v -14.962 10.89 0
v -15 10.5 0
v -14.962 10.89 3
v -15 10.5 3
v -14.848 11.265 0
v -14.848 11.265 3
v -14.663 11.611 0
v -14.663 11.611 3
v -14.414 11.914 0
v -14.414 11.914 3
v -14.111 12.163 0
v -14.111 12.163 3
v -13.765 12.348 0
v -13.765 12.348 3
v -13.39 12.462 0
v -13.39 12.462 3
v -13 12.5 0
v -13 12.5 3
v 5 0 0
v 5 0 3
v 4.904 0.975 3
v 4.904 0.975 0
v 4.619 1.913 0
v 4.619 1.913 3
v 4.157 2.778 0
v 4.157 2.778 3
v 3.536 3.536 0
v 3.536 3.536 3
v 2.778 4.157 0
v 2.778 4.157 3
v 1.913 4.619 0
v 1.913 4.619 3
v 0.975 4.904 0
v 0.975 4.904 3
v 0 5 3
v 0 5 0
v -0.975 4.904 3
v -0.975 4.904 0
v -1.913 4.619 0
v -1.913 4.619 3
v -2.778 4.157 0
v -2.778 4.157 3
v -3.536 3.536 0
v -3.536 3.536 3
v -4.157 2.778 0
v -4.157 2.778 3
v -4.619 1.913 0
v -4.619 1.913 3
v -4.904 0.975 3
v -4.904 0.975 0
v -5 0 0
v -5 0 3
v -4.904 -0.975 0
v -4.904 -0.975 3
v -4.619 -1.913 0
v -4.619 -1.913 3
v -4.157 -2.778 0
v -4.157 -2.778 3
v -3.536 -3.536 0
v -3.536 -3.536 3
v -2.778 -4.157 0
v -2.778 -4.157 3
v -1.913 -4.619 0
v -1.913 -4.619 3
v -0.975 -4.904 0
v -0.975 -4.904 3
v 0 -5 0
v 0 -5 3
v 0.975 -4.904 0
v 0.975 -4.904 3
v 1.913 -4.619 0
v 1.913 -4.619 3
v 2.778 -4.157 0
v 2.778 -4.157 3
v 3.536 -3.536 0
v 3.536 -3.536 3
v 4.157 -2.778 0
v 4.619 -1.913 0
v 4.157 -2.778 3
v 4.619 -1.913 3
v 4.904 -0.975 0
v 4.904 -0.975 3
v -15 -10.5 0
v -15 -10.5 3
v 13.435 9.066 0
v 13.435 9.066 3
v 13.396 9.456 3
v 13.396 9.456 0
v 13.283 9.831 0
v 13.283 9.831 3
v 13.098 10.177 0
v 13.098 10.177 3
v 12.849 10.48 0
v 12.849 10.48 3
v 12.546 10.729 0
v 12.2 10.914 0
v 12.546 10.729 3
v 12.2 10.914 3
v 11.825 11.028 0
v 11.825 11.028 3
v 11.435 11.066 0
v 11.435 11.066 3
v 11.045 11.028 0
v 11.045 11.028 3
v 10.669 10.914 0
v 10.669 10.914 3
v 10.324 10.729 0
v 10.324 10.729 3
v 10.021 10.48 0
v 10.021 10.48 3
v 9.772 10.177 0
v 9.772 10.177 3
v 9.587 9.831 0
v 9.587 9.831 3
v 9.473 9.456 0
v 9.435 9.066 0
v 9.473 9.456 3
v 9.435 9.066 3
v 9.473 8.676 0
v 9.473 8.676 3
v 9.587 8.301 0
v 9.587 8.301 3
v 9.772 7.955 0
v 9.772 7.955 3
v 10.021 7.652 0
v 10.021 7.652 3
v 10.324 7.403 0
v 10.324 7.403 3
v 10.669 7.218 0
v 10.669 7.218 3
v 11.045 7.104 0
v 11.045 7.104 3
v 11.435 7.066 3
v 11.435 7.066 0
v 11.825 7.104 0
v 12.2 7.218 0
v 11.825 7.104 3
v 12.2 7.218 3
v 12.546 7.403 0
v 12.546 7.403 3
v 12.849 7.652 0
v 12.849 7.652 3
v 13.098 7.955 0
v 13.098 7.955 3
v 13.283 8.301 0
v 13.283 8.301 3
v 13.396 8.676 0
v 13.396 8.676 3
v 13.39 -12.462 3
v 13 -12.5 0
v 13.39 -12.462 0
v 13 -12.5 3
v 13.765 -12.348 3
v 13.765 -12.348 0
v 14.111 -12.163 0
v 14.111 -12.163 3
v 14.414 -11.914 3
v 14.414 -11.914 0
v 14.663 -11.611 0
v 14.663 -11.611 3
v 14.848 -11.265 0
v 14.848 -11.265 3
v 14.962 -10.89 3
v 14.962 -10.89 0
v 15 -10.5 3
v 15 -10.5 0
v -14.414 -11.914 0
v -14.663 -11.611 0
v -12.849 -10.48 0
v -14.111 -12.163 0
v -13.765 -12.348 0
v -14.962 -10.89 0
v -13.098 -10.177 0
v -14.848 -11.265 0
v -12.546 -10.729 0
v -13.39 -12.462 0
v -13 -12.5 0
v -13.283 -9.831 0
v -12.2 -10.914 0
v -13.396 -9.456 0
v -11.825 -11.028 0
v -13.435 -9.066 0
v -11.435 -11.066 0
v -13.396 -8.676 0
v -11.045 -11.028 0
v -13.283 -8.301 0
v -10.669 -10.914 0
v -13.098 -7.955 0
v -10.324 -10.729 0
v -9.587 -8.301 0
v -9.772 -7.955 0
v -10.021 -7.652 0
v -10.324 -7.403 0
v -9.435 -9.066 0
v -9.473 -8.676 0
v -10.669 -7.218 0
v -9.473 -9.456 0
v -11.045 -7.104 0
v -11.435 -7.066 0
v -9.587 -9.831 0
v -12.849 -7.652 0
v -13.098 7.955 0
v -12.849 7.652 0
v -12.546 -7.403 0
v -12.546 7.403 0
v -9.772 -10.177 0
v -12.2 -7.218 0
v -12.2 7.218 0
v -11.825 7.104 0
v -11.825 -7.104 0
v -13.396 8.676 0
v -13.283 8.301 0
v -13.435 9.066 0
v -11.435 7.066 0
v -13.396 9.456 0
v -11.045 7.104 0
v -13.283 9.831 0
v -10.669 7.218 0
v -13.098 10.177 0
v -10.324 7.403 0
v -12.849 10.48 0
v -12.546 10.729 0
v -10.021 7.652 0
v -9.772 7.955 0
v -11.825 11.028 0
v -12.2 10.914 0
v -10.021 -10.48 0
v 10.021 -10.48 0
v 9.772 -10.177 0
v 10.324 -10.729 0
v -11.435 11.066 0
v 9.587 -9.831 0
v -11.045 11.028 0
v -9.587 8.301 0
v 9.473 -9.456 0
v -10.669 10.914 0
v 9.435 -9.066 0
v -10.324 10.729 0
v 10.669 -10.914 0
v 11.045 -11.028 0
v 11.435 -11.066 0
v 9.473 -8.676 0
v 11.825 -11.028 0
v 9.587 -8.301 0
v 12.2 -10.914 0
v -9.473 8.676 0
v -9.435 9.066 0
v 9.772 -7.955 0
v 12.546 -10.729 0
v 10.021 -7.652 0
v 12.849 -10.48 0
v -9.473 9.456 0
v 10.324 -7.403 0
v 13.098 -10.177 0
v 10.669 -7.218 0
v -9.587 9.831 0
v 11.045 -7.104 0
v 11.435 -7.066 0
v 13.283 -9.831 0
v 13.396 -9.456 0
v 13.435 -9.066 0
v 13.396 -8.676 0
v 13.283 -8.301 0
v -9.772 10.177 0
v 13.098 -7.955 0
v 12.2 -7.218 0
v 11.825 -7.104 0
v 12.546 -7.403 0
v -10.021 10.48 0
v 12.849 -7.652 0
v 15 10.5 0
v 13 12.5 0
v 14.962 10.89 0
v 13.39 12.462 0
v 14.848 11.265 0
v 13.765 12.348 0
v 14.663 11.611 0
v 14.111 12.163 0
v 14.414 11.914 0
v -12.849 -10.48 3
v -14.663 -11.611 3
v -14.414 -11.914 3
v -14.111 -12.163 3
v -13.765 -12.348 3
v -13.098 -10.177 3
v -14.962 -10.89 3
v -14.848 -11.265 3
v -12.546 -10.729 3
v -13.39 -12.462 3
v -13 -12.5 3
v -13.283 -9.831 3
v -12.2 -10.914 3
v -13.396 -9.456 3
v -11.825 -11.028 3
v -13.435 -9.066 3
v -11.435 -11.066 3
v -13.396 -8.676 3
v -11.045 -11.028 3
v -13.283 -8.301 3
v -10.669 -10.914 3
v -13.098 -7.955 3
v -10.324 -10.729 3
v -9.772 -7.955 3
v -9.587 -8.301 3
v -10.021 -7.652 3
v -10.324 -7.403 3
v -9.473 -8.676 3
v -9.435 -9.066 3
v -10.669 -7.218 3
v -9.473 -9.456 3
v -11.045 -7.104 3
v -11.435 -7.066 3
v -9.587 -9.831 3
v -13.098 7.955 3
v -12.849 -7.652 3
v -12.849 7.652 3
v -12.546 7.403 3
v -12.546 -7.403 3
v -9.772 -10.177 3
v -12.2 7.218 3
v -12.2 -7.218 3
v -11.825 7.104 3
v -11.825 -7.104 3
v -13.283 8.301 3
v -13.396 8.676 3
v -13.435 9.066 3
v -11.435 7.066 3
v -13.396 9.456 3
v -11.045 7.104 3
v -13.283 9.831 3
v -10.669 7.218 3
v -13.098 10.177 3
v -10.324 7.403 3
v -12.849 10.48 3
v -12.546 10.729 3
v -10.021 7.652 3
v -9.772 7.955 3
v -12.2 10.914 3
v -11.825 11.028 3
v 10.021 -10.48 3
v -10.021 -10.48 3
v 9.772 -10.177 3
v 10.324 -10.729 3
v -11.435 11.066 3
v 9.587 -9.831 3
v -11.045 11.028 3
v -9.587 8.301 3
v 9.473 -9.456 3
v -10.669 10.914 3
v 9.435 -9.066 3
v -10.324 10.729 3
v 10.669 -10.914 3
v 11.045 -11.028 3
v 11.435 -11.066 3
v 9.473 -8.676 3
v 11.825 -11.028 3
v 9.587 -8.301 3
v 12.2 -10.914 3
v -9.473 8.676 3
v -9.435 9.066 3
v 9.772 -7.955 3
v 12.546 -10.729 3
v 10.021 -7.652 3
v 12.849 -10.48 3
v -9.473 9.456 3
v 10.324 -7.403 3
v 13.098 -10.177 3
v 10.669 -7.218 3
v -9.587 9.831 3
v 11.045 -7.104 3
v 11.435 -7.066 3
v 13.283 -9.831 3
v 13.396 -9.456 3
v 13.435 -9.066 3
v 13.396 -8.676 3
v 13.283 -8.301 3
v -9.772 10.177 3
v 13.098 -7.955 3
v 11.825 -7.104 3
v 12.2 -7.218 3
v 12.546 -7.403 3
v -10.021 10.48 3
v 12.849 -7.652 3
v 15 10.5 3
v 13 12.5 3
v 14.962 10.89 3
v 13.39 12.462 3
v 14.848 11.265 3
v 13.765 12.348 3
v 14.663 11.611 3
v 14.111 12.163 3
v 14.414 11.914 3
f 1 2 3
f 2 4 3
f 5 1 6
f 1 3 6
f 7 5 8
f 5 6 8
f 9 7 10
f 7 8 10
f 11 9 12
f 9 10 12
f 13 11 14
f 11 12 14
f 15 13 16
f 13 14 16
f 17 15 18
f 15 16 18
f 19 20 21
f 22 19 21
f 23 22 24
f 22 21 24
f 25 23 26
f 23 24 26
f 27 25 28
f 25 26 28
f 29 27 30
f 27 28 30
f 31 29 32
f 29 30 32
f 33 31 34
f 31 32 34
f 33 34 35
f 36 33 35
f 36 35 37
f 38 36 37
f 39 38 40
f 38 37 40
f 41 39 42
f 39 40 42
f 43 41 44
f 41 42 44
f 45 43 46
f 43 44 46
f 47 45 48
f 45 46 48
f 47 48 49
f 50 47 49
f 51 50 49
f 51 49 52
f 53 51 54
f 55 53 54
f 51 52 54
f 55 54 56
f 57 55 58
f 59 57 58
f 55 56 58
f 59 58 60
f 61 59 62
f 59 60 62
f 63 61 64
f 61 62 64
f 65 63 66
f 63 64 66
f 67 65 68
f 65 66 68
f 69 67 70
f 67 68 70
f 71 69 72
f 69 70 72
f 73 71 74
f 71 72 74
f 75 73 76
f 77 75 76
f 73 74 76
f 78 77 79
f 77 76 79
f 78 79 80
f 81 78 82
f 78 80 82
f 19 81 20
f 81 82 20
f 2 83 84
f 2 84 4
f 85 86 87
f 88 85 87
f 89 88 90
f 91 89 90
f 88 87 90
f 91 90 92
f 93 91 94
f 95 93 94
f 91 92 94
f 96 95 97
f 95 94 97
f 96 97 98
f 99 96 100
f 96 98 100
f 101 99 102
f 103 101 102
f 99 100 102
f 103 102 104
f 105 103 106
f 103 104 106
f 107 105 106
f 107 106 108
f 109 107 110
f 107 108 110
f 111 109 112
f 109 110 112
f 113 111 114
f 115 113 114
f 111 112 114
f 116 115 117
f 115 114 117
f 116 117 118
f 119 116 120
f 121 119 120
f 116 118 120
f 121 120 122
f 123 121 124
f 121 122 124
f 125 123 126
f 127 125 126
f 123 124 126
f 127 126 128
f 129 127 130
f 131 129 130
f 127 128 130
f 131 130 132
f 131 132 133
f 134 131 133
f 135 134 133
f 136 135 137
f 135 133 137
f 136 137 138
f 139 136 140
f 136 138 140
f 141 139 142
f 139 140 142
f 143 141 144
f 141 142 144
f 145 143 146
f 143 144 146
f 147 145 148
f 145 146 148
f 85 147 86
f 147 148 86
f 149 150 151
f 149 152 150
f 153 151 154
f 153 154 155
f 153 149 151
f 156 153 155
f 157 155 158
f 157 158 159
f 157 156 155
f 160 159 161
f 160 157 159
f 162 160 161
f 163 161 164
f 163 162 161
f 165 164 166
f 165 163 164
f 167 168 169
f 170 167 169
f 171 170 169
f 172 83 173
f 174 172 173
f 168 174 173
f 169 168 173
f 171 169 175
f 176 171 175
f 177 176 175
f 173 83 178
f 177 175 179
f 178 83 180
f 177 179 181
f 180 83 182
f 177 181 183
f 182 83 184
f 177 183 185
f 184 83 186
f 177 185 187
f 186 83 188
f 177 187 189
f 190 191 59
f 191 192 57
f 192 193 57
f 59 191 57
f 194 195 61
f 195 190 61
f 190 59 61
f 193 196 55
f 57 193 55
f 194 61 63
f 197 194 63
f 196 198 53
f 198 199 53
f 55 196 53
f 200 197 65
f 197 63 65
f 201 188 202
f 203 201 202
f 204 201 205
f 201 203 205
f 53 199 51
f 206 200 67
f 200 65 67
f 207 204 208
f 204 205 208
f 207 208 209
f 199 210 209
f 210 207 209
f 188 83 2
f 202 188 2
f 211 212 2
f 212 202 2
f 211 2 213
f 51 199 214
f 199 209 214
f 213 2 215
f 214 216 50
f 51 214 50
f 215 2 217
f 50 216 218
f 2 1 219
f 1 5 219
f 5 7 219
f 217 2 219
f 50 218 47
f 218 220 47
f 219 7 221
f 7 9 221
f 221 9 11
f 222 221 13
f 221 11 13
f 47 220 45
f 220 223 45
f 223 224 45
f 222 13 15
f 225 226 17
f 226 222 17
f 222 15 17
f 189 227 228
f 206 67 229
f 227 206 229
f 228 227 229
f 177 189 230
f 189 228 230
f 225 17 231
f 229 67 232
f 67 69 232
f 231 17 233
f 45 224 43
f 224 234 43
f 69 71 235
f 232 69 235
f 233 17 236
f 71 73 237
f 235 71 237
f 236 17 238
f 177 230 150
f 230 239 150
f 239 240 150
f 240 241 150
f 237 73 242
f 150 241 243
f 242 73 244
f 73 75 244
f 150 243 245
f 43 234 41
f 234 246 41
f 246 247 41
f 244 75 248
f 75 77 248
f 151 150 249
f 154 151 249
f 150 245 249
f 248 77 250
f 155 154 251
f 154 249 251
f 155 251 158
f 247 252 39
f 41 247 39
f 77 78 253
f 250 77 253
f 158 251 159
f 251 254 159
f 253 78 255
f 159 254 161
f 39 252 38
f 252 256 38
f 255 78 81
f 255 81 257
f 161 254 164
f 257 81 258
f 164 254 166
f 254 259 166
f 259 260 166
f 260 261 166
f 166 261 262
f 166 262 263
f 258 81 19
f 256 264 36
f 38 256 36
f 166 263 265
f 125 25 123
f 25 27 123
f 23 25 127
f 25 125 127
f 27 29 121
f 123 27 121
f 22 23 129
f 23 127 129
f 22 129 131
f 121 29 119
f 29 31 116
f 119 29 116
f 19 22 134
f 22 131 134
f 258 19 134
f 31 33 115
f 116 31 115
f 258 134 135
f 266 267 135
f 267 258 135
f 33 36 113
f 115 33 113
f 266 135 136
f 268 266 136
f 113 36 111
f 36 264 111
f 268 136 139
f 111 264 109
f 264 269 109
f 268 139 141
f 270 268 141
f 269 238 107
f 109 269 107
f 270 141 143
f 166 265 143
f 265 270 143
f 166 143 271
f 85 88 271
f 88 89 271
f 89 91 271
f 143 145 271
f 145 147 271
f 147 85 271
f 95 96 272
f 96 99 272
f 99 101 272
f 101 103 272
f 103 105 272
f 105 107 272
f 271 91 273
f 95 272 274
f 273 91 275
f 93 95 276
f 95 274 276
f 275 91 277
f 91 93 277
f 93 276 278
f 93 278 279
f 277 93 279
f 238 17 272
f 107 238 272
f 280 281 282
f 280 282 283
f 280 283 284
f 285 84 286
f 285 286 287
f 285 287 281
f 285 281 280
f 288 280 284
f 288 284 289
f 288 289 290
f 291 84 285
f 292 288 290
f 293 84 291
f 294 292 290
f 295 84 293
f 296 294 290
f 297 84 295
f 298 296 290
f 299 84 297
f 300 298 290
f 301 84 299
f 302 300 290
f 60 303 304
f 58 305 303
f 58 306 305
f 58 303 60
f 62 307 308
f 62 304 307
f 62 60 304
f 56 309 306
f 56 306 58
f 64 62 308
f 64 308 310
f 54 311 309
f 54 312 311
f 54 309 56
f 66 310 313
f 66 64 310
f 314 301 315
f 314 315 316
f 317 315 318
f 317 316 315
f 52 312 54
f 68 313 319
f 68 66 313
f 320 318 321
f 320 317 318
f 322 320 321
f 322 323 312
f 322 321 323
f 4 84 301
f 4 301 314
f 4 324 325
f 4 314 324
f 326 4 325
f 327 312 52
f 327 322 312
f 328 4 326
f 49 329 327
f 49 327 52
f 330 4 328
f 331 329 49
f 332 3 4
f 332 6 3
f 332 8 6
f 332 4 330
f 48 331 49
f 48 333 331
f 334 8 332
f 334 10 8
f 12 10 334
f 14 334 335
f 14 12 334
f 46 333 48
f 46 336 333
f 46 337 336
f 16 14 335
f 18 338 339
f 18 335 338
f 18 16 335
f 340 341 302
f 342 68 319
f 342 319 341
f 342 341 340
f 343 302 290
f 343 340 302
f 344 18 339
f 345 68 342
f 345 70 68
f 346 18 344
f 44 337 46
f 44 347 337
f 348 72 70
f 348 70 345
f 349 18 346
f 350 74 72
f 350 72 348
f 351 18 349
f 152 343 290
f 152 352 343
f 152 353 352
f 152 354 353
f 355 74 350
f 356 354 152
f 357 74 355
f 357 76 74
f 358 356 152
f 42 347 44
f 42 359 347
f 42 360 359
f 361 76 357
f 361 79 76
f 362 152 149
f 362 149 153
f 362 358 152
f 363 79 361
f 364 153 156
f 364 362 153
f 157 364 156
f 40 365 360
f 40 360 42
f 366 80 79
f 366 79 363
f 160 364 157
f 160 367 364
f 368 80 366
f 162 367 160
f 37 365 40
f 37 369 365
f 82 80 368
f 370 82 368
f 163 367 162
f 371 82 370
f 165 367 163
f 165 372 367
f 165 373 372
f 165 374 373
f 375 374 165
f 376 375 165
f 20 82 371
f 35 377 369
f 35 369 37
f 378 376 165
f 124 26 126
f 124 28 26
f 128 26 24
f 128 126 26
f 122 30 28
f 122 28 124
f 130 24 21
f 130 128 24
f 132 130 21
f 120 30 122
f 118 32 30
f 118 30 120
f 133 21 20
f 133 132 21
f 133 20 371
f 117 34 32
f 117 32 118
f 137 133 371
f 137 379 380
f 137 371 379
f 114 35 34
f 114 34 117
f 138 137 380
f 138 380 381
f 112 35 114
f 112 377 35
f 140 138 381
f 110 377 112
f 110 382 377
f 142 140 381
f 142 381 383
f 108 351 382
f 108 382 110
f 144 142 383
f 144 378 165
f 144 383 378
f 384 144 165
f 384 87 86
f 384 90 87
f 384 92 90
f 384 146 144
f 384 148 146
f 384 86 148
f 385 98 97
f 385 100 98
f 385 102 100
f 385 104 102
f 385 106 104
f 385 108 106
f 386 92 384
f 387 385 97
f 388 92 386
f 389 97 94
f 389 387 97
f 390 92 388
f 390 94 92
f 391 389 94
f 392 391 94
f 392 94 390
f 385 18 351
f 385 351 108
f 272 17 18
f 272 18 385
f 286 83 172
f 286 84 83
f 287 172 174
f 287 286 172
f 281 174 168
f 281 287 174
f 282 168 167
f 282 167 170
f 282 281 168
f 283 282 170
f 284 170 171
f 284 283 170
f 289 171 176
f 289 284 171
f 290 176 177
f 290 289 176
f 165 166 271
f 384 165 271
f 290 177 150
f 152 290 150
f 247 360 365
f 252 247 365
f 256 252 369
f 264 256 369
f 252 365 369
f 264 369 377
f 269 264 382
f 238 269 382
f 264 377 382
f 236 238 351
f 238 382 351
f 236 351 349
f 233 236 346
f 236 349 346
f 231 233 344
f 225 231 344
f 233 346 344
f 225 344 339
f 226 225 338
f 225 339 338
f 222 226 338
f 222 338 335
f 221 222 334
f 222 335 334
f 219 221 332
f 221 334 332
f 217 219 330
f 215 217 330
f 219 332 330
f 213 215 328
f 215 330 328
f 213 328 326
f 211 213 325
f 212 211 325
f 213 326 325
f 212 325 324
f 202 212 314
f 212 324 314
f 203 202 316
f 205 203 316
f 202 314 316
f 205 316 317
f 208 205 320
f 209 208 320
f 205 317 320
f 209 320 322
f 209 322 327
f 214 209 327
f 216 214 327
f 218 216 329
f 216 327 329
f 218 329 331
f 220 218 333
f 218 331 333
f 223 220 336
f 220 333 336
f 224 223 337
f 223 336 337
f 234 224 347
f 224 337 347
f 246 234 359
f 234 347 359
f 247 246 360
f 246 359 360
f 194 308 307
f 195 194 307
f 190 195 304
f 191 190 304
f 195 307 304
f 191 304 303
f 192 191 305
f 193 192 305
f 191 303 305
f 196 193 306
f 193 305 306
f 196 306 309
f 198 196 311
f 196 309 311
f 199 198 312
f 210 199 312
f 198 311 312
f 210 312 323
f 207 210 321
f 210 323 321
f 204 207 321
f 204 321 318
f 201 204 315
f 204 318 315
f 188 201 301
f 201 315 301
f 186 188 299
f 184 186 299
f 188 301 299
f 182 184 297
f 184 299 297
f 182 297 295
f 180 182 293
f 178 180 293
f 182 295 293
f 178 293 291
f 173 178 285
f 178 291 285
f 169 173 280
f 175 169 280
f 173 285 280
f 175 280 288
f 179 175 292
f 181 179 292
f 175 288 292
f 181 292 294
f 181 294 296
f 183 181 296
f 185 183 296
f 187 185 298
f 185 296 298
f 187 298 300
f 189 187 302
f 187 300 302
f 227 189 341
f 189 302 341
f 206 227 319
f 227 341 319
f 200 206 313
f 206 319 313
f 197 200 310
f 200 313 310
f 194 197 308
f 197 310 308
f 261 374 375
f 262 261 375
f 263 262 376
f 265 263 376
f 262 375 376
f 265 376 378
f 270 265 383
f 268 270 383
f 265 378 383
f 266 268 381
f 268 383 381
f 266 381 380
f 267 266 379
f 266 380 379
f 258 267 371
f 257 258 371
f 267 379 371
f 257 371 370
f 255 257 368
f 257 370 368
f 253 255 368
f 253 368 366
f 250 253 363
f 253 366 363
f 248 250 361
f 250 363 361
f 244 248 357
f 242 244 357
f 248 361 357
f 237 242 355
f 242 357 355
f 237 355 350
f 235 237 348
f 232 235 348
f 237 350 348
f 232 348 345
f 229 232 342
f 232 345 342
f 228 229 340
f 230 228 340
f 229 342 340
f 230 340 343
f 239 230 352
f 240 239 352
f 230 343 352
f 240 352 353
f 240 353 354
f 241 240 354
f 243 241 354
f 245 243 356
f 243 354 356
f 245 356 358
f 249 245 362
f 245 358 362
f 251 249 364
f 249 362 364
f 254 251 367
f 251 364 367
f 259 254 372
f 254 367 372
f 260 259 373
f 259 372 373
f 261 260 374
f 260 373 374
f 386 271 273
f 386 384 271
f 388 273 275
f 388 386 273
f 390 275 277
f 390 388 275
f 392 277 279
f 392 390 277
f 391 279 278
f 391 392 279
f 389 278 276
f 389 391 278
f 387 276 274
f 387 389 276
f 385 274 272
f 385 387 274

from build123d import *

# Parameters (mm, degrees)
F0_W     = 30
F0_H     = 25
F1_DEPTH = 3
F2_R     = 2
F3_R     = 5
F4_DEPTH = 3
F5_R     = 2
F6_DEPTH = 3


with BuildPart() as f1:
    # F0 (on Top) → F1 (new body)
    with BuildSketch(Plane.XY):
        Rectangle(F0_W, F0_H)
    extrude(amount=F1_DEPTH)

    # F2
    f2_edges = [f1.edges().sort_by_distance(p)[0] for p in [
        (15, 12.5, 1.5),
        (-15, 12.5, 1.5),
        (-15, -12.5, 1.5),
        (15, -12.5, 1.5),
    ]]
    fillet(f2_edges, radius=F2_R)

    # F3 (on face) → F4 (cut)
    with BuildSketch(Plane.XY.offset(3)):
        Circle(F3_R)
    extrude(amount=-F4_DEPTH, mode=Mode.SUBTRACT)

    # F5 (on face) → F6 (cut)
    with BuildSketch(Plane.XY.offset(3)):
        with Locations((-11.434802, 9.066023)):
            Circle(F5_R)
        with Locations((11.434802, 9.066023)):
            Circle(F5_R)
        with Locations((-11.434802, -9.066023)):
            Circle(F5_R)
        with Locations((11.434802, -9.066023)):
            Circle(F5_R)
    extrude(amount=-F6_DEPTH, mode=Mode.SUBTRACT)


solid = f1.part
